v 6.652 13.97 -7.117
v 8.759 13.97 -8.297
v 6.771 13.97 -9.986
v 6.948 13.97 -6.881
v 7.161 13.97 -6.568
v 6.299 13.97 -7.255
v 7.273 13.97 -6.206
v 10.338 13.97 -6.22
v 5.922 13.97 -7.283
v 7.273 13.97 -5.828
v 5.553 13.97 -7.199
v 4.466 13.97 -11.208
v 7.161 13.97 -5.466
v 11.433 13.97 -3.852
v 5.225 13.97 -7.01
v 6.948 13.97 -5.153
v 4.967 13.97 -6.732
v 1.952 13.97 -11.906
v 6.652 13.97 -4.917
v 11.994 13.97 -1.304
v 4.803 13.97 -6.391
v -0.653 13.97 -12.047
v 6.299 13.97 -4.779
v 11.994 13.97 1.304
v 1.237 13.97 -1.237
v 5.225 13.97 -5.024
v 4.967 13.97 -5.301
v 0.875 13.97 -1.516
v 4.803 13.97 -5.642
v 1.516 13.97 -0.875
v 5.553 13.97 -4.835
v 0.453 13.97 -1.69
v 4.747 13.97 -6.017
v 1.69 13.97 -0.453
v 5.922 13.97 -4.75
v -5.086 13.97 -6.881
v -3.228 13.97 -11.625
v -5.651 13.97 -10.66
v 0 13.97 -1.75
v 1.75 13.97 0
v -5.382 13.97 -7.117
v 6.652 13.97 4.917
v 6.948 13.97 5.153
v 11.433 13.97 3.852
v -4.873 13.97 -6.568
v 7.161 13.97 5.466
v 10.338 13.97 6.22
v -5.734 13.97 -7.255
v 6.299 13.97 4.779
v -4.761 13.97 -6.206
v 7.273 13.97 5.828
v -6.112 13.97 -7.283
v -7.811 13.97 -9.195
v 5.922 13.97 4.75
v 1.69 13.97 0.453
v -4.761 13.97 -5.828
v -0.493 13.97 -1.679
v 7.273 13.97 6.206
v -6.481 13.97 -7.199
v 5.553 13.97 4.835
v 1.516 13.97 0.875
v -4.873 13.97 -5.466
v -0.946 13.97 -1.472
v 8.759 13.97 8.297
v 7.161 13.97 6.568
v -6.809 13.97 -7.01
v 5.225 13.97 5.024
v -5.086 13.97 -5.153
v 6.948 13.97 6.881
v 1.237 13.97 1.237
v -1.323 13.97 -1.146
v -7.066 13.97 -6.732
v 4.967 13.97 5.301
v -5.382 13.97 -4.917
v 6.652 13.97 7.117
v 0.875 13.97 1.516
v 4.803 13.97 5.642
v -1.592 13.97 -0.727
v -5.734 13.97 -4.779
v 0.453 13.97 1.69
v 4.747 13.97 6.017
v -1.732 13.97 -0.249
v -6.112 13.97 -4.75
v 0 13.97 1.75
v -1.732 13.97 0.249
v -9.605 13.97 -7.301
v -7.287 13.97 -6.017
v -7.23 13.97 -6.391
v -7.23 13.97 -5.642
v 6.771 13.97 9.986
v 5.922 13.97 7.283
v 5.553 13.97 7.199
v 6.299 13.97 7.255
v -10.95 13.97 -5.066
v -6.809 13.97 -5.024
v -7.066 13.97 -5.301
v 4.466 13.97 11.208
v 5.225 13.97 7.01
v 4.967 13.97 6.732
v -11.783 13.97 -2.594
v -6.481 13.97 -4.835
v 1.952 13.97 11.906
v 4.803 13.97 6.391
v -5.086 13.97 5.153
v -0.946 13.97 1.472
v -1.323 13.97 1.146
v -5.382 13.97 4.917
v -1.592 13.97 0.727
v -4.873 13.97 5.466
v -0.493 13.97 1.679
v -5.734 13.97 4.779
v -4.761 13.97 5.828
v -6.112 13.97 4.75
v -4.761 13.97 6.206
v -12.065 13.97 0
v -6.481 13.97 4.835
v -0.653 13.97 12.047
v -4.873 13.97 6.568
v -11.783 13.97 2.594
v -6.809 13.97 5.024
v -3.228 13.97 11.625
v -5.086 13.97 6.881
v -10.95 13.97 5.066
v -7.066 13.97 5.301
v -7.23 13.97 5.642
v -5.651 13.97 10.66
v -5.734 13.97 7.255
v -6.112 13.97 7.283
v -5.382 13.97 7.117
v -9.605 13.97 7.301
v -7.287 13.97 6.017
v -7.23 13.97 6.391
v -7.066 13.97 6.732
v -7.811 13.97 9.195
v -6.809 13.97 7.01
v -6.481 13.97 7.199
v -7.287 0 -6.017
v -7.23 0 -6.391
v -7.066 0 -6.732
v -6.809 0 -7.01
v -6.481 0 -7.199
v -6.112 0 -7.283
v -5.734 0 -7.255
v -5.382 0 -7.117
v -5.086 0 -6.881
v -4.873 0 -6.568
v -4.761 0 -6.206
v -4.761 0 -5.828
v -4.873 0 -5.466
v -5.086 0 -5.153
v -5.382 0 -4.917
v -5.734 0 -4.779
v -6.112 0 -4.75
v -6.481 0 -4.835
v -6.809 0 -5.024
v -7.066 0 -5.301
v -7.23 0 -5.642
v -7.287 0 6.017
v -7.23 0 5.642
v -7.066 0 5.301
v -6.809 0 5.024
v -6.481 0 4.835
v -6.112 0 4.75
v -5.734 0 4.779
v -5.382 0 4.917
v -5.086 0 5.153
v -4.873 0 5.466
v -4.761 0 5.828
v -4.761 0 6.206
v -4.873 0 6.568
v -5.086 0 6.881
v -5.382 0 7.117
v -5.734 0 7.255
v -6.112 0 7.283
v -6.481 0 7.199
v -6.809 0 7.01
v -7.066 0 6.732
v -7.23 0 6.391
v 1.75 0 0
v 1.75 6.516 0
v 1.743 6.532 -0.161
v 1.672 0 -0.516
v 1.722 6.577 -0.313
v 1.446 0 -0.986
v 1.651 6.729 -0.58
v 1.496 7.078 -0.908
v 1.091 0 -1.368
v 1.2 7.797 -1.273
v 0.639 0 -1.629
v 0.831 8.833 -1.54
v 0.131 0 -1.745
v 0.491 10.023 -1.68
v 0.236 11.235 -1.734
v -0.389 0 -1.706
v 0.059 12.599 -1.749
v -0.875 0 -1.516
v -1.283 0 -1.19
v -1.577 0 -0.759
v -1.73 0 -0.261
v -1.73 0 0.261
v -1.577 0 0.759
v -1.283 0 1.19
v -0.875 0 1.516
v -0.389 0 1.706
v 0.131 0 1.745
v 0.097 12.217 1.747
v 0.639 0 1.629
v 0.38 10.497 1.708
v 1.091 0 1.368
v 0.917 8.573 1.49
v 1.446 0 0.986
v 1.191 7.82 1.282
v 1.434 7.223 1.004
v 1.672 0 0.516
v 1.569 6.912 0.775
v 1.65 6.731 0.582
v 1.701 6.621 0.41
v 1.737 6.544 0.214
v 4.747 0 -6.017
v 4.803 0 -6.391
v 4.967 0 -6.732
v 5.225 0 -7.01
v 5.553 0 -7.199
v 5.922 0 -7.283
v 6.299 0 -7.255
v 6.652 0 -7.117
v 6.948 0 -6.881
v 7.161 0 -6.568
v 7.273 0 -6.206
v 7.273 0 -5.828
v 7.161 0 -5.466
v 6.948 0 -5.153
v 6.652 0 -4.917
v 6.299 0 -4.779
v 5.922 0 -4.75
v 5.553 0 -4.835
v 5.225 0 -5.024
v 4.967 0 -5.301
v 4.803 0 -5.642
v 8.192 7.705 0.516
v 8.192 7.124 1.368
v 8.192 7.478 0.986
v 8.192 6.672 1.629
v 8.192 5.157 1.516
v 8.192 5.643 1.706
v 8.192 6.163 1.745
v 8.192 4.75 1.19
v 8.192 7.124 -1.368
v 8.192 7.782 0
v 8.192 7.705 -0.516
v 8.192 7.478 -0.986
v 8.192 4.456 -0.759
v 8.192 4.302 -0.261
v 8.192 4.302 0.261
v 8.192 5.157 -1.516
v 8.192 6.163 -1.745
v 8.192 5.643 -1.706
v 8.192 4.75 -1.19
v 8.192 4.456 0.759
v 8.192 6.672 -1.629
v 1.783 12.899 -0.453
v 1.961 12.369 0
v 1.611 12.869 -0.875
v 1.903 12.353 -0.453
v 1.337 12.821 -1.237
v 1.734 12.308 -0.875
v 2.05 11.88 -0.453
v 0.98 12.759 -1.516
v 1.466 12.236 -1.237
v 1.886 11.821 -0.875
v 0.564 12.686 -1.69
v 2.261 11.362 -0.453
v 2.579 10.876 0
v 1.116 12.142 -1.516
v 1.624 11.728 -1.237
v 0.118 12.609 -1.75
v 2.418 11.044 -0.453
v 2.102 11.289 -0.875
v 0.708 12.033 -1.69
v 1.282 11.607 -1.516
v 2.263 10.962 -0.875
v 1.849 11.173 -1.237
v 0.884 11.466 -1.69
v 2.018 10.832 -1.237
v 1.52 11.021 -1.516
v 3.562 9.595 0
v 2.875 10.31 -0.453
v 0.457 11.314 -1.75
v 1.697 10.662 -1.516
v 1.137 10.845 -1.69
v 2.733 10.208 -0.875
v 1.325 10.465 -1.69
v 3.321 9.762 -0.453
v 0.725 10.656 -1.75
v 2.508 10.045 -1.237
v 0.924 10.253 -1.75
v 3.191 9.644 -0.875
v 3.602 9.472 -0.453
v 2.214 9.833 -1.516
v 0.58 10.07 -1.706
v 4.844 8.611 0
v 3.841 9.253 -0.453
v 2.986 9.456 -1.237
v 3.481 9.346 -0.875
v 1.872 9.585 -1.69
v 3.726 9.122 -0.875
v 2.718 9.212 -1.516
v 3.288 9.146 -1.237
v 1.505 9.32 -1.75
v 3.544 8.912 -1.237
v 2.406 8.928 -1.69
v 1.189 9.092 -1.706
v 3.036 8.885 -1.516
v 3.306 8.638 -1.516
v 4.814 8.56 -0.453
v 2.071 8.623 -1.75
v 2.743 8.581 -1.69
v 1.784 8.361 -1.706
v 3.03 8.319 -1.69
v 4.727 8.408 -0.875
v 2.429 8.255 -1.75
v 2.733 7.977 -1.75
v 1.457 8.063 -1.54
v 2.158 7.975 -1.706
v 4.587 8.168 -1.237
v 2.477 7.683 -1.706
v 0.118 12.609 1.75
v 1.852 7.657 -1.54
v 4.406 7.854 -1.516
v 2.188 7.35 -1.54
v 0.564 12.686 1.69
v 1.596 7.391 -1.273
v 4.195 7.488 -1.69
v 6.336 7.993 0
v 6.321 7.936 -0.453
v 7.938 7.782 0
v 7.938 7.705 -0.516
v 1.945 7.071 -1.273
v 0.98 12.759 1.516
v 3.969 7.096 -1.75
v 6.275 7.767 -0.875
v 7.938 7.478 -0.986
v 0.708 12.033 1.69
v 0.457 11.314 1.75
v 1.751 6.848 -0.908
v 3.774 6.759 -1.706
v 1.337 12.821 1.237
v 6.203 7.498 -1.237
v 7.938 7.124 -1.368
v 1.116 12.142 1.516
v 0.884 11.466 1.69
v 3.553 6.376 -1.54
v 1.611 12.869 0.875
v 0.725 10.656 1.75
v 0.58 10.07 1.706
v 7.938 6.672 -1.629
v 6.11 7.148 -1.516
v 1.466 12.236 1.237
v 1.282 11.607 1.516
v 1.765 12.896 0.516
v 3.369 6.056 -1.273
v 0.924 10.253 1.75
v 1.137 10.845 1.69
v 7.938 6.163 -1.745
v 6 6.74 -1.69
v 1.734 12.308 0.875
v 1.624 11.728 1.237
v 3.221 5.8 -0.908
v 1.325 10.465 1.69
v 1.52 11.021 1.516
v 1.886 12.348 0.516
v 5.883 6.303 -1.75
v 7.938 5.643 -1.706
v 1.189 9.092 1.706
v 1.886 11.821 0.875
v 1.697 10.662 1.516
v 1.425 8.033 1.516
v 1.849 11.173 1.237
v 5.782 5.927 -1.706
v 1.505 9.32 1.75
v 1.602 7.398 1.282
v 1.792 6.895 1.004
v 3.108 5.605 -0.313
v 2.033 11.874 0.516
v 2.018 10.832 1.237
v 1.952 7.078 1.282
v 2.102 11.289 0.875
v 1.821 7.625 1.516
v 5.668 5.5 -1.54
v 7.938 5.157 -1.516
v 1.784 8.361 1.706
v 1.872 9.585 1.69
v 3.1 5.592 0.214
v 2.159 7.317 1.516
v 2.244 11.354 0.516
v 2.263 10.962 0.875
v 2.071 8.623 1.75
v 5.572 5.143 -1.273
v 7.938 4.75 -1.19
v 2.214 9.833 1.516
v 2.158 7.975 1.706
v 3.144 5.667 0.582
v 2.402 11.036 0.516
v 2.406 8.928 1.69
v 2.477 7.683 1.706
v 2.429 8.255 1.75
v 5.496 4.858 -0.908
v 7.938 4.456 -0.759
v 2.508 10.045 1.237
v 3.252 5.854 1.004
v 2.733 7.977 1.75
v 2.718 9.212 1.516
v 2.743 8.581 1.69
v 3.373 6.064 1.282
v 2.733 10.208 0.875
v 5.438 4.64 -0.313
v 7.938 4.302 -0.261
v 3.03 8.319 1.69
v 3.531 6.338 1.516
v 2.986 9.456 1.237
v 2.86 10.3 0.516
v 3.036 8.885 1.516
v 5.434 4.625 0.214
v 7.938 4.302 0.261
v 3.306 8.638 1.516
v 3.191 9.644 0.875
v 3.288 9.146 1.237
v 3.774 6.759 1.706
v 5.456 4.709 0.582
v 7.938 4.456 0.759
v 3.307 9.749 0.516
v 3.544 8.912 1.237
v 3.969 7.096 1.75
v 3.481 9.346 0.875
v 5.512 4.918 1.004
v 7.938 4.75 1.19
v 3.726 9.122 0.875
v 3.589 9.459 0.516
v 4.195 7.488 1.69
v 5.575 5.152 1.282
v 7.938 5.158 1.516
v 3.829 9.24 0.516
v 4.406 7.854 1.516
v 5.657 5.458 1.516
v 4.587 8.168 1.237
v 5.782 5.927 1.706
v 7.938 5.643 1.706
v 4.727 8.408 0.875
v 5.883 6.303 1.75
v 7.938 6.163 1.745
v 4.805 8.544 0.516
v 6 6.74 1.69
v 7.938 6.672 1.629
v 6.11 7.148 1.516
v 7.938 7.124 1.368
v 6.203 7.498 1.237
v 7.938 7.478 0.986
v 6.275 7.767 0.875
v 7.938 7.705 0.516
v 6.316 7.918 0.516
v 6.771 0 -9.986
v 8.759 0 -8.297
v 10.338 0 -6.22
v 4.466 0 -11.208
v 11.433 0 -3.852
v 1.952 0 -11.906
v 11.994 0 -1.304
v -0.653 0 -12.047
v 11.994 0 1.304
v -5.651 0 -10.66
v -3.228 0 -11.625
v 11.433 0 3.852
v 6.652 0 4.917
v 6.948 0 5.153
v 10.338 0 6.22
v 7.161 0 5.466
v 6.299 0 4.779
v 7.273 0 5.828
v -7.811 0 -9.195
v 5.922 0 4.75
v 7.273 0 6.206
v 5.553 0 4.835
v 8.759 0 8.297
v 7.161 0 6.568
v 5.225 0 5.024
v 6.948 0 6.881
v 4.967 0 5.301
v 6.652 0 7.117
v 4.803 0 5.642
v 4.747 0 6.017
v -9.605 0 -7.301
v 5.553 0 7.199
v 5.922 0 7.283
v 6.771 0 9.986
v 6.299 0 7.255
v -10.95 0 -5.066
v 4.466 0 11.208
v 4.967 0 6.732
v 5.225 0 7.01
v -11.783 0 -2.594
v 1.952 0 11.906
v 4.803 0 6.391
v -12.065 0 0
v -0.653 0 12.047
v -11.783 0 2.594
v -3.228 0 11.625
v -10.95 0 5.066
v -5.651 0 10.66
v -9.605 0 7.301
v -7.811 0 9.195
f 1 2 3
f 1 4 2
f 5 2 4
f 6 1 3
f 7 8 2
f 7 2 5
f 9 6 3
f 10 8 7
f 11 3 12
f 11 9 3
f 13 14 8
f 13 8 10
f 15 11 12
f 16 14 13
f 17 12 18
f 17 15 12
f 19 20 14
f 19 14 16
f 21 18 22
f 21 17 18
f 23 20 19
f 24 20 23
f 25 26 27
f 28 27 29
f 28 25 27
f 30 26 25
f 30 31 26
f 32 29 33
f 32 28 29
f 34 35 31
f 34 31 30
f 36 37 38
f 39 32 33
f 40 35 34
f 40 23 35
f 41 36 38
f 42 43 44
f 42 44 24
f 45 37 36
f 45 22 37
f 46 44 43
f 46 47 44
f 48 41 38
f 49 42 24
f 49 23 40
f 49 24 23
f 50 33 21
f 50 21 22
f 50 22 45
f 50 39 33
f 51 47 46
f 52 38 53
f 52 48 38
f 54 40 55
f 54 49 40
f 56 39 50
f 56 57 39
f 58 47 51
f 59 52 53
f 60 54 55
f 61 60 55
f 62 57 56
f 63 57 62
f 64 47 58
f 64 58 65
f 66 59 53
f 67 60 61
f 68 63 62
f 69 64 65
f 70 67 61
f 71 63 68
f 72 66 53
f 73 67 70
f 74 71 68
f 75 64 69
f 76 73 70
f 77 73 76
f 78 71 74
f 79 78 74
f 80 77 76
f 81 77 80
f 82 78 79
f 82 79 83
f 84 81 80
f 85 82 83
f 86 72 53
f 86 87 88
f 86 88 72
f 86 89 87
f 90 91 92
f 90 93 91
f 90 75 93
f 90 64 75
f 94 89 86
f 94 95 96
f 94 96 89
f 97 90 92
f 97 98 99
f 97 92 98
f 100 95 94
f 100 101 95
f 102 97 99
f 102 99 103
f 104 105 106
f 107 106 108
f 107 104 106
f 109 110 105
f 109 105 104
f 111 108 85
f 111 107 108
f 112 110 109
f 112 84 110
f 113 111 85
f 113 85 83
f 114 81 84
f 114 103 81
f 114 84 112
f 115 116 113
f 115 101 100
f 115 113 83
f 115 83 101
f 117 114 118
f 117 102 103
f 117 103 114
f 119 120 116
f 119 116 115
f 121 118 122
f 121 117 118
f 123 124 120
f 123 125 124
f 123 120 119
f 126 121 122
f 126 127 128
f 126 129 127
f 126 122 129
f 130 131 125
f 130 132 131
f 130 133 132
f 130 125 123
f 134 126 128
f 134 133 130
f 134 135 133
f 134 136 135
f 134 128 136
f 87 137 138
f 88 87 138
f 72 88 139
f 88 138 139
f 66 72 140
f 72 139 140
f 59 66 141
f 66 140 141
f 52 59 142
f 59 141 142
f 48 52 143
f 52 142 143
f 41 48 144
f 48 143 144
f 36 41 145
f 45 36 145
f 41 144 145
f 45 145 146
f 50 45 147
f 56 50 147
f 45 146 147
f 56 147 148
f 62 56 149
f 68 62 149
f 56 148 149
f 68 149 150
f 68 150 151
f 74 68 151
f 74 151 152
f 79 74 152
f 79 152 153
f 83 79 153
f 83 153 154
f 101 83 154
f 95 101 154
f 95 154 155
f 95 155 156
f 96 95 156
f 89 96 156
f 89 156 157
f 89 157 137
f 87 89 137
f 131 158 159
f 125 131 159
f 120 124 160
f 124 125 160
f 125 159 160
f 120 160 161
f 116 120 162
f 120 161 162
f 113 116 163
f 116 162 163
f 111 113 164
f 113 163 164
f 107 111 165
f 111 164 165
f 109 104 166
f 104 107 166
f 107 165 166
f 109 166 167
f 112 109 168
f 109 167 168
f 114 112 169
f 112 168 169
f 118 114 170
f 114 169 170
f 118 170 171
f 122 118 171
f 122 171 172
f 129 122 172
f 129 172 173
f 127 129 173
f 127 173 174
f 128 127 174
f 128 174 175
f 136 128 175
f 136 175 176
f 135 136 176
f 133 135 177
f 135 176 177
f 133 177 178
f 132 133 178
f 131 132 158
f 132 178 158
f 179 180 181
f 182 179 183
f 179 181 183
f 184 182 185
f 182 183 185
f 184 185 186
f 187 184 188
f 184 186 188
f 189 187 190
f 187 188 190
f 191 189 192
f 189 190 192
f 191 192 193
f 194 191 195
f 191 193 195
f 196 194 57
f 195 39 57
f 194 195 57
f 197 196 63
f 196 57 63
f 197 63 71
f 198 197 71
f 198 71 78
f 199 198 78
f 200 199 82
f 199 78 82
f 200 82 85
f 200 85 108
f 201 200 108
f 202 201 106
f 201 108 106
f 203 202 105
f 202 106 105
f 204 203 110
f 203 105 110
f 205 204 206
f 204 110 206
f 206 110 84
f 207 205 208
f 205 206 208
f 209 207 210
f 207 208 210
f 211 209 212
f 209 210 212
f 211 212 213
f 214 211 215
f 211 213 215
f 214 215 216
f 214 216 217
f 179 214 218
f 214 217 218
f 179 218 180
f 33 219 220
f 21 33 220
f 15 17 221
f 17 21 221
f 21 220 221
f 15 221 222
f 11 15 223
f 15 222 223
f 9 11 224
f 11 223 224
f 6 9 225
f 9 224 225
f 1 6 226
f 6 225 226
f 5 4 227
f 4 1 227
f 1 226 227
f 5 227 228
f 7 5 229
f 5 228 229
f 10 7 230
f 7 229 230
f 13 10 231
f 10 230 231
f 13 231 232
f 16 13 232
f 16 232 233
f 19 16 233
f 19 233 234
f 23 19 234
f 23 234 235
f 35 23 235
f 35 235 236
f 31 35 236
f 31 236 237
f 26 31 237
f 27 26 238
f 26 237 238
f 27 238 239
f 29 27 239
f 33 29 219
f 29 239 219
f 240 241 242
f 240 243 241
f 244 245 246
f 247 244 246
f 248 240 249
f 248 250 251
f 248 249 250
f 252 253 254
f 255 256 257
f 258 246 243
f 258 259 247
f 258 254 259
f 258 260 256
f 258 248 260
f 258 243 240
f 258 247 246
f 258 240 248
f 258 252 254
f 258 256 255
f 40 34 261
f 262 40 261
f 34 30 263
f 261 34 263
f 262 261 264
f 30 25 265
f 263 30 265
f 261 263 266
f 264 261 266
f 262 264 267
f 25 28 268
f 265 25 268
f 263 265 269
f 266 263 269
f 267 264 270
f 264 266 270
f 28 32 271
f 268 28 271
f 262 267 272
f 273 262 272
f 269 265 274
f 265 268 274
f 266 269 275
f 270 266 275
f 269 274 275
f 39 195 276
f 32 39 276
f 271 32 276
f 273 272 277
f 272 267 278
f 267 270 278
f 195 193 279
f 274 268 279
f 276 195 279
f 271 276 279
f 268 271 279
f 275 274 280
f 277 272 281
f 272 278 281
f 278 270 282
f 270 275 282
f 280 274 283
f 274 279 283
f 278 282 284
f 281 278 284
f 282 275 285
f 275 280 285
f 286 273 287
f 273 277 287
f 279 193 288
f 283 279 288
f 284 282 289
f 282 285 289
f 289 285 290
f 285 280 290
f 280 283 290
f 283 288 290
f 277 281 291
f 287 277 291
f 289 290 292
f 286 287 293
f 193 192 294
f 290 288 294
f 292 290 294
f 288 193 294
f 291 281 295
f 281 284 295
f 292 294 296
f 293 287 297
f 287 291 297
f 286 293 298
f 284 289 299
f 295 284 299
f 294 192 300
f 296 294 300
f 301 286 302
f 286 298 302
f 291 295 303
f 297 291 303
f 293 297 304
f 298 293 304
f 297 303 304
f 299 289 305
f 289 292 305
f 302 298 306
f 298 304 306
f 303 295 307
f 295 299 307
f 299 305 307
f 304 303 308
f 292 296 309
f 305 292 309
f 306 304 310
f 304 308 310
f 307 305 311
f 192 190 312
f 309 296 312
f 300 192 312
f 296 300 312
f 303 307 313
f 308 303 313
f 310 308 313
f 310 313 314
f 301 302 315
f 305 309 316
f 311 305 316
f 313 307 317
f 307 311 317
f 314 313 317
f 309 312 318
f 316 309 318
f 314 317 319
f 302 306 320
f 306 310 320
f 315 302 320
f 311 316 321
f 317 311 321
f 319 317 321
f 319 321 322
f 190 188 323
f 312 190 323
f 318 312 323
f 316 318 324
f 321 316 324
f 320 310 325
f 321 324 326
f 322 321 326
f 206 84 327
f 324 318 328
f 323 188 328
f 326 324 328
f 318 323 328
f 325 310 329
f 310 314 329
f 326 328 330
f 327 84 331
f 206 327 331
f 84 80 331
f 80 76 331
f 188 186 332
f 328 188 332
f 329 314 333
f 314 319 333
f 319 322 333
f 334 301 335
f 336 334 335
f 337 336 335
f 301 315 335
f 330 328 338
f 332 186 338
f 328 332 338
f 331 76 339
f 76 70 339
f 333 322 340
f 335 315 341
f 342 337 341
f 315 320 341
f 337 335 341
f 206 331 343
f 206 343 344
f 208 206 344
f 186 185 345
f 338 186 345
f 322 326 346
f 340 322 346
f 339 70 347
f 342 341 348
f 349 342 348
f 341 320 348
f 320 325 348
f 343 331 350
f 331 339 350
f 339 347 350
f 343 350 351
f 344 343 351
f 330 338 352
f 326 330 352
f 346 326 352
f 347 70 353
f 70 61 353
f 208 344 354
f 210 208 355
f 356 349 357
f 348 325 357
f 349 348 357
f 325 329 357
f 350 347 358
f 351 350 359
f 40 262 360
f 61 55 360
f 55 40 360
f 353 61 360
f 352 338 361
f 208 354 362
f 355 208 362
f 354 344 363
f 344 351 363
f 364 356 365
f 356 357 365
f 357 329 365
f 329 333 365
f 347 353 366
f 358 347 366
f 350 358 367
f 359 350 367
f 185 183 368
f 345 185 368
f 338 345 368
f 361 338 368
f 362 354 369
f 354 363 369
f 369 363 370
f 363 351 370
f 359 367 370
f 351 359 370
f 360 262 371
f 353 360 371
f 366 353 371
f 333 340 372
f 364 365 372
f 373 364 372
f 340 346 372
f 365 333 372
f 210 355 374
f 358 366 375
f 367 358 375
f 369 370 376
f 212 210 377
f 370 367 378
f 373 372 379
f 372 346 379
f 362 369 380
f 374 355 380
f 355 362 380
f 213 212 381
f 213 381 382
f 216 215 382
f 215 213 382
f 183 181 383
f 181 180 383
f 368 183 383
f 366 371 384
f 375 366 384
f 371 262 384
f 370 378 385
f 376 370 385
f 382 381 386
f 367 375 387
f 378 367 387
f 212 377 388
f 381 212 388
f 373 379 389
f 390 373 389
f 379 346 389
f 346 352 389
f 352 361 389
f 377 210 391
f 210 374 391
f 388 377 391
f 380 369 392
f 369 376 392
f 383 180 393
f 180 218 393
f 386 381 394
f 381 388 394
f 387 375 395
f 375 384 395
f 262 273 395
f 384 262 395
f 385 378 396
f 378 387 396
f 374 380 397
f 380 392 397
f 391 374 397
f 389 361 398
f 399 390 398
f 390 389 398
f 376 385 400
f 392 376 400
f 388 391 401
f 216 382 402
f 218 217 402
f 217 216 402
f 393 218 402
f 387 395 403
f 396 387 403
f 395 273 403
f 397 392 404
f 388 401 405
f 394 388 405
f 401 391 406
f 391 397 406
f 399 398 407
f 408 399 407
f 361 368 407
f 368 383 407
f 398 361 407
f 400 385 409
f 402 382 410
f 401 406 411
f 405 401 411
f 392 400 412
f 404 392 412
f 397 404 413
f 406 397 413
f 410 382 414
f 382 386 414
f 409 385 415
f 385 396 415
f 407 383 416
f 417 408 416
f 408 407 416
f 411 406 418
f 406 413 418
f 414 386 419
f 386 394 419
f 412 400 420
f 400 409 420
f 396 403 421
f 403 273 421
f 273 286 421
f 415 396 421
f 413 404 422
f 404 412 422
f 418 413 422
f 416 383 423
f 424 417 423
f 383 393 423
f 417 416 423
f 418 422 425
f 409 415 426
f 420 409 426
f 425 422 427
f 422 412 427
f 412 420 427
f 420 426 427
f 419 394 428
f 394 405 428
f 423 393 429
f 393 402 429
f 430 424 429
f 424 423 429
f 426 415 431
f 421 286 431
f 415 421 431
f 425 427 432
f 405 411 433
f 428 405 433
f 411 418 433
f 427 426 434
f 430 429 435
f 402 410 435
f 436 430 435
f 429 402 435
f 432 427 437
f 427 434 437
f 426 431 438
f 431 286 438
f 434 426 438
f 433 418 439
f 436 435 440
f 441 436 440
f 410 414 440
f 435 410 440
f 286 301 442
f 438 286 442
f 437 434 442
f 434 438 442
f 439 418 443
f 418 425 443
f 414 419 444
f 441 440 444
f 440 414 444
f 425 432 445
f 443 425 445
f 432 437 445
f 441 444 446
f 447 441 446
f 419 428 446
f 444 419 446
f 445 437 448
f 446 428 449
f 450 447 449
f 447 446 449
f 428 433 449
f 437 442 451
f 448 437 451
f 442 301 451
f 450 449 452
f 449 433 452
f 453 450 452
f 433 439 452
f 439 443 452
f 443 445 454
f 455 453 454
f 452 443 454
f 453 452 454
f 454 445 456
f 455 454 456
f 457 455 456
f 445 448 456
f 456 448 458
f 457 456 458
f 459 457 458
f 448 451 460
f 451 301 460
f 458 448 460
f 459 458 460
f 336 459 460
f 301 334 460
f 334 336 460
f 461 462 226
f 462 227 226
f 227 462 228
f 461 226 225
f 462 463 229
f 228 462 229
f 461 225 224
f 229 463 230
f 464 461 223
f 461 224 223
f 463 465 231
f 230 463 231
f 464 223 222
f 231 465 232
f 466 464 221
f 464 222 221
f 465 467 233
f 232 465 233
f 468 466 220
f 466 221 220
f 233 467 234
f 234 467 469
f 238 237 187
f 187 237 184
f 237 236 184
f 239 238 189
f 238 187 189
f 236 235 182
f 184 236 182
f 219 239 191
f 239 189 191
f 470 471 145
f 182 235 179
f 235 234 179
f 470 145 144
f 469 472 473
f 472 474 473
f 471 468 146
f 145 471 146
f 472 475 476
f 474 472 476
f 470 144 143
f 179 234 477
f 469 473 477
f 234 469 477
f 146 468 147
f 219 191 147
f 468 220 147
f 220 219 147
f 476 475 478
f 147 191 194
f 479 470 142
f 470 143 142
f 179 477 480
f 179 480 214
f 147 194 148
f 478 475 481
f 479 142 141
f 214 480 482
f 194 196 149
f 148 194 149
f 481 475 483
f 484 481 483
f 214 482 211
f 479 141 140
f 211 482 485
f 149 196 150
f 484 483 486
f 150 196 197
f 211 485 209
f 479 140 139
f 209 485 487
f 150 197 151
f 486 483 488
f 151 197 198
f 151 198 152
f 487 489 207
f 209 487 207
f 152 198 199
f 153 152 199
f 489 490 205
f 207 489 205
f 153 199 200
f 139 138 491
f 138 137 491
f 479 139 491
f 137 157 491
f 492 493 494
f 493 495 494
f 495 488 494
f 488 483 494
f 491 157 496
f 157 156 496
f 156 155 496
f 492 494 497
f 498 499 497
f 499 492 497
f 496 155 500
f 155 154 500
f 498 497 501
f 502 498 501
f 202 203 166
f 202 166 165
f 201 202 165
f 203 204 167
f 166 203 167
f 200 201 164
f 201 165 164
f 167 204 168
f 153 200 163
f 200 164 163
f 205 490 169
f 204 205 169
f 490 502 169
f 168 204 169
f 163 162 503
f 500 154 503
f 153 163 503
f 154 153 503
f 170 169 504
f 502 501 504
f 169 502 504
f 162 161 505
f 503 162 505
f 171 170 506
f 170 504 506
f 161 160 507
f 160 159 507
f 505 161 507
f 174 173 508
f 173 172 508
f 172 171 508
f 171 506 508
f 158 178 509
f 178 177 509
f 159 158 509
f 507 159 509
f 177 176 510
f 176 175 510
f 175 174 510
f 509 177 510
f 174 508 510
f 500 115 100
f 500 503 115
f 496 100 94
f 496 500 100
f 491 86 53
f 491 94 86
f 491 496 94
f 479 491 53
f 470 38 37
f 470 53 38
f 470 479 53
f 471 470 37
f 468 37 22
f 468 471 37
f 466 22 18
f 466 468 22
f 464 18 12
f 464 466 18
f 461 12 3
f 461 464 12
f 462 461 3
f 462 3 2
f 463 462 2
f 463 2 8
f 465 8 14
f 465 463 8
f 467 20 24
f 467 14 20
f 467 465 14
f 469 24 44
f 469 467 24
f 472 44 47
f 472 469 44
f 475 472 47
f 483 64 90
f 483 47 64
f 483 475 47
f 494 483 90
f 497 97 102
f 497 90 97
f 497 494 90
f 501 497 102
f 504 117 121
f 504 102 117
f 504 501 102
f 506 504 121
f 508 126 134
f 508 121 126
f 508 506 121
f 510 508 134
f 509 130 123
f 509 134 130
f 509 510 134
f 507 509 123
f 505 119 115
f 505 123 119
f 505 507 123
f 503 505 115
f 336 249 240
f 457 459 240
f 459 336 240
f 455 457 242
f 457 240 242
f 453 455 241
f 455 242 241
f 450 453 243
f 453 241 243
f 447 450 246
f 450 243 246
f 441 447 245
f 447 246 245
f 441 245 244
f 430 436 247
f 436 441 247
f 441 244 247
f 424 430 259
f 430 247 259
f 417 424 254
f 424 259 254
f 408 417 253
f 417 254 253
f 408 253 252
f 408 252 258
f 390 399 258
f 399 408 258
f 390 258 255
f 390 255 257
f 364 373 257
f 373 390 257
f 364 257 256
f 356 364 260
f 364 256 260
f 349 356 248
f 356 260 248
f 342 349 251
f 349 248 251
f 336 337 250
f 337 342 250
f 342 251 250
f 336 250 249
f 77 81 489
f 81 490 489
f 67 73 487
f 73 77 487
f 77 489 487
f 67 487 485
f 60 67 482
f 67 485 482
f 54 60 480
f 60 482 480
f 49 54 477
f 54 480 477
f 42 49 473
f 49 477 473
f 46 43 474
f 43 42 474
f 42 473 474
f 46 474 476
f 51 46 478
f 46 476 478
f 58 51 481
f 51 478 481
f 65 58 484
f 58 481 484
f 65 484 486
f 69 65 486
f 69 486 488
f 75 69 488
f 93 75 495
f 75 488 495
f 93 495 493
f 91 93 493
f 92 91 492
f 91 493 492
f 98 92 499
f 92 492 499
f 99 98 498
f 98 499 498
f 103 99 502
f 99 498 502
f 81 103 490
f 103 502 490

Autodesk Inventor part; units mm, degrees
ref_plane "YZ Plane" through (0, 0, 0) normal (1, 0, 0) x (0, 1, 0)
ref_plane "XZ Plane" through (0, 0, 0) normal (0, 1, 0) x (-1, 0, 0)
ref_plane "XY Plane" through (0, 0, 0) normal (0, 0, 1) x (1, 0, 0)
sketch "Sketch1" plane through (0, 0, 0) normal (0, 1, 0) x (-1, 0, 0)
  circle A0 centre (0, 0) radius 12.065
  line L0 (0, 0) -> (6.0168, -6.0168)
  line L1 (0, 0) -> (8.509, 0) construction
  circle A1 centre (6.0168, -6.0168) radius 1.27
  circle A2 centre (6.0168, 6.0168) radius 1.27
  circle A3 centre (-6.0168, 6.0168) radius 1.27
  circle A4 centre (-6.0168, -6.0168) radius 1.27
  dimension "d0" = 24.13
  dimension "d1" = 45
  dimension "d2" = 8.509
  dimension "d3" = 2.54
  dimension "d6" = 360
extrude "Extrusion1" add sketch "Sketch1" along normal blind 13.97
sketch "Sketch6" plane through (0, 13.97, 0) normal (0, 1, 0) x (1, 0, 0)
  circle A0 centre (0, 0) radius 1.75
  dimension "d32" = 3.5
extrude "Extrusion3" cut sketch "Sketch6" against normal through all
sketch "Sketch3" plane through (0, 13.97, 0) normal (0, 1, 0) x (1, 0, 0)
  circle A0 centre (0, 0) radius 1.75
  dimension "d14" = 3.5
sketch "Sketch7" plane through (0, 0, 0) normal (0, 0, 1) x (1, 0, 0)
  arc A0 (0, 13.97) -> (7.9375, 6.0325) centre (7.9375, 13.97) ccw
  line L0 (7.9375, 6.0325) -> (8.1915, 6.0325)
  point P0 (0, 0)
  dimension "d27" = 7.9375
  dimension "d28" = 7.9375
  dimension "d31" = 0.254
sweep "Sweep2" cut profiles "Sketch3" path "Sketch7"
properties part number "1PieceAttachment" material "ABS Plastic"
